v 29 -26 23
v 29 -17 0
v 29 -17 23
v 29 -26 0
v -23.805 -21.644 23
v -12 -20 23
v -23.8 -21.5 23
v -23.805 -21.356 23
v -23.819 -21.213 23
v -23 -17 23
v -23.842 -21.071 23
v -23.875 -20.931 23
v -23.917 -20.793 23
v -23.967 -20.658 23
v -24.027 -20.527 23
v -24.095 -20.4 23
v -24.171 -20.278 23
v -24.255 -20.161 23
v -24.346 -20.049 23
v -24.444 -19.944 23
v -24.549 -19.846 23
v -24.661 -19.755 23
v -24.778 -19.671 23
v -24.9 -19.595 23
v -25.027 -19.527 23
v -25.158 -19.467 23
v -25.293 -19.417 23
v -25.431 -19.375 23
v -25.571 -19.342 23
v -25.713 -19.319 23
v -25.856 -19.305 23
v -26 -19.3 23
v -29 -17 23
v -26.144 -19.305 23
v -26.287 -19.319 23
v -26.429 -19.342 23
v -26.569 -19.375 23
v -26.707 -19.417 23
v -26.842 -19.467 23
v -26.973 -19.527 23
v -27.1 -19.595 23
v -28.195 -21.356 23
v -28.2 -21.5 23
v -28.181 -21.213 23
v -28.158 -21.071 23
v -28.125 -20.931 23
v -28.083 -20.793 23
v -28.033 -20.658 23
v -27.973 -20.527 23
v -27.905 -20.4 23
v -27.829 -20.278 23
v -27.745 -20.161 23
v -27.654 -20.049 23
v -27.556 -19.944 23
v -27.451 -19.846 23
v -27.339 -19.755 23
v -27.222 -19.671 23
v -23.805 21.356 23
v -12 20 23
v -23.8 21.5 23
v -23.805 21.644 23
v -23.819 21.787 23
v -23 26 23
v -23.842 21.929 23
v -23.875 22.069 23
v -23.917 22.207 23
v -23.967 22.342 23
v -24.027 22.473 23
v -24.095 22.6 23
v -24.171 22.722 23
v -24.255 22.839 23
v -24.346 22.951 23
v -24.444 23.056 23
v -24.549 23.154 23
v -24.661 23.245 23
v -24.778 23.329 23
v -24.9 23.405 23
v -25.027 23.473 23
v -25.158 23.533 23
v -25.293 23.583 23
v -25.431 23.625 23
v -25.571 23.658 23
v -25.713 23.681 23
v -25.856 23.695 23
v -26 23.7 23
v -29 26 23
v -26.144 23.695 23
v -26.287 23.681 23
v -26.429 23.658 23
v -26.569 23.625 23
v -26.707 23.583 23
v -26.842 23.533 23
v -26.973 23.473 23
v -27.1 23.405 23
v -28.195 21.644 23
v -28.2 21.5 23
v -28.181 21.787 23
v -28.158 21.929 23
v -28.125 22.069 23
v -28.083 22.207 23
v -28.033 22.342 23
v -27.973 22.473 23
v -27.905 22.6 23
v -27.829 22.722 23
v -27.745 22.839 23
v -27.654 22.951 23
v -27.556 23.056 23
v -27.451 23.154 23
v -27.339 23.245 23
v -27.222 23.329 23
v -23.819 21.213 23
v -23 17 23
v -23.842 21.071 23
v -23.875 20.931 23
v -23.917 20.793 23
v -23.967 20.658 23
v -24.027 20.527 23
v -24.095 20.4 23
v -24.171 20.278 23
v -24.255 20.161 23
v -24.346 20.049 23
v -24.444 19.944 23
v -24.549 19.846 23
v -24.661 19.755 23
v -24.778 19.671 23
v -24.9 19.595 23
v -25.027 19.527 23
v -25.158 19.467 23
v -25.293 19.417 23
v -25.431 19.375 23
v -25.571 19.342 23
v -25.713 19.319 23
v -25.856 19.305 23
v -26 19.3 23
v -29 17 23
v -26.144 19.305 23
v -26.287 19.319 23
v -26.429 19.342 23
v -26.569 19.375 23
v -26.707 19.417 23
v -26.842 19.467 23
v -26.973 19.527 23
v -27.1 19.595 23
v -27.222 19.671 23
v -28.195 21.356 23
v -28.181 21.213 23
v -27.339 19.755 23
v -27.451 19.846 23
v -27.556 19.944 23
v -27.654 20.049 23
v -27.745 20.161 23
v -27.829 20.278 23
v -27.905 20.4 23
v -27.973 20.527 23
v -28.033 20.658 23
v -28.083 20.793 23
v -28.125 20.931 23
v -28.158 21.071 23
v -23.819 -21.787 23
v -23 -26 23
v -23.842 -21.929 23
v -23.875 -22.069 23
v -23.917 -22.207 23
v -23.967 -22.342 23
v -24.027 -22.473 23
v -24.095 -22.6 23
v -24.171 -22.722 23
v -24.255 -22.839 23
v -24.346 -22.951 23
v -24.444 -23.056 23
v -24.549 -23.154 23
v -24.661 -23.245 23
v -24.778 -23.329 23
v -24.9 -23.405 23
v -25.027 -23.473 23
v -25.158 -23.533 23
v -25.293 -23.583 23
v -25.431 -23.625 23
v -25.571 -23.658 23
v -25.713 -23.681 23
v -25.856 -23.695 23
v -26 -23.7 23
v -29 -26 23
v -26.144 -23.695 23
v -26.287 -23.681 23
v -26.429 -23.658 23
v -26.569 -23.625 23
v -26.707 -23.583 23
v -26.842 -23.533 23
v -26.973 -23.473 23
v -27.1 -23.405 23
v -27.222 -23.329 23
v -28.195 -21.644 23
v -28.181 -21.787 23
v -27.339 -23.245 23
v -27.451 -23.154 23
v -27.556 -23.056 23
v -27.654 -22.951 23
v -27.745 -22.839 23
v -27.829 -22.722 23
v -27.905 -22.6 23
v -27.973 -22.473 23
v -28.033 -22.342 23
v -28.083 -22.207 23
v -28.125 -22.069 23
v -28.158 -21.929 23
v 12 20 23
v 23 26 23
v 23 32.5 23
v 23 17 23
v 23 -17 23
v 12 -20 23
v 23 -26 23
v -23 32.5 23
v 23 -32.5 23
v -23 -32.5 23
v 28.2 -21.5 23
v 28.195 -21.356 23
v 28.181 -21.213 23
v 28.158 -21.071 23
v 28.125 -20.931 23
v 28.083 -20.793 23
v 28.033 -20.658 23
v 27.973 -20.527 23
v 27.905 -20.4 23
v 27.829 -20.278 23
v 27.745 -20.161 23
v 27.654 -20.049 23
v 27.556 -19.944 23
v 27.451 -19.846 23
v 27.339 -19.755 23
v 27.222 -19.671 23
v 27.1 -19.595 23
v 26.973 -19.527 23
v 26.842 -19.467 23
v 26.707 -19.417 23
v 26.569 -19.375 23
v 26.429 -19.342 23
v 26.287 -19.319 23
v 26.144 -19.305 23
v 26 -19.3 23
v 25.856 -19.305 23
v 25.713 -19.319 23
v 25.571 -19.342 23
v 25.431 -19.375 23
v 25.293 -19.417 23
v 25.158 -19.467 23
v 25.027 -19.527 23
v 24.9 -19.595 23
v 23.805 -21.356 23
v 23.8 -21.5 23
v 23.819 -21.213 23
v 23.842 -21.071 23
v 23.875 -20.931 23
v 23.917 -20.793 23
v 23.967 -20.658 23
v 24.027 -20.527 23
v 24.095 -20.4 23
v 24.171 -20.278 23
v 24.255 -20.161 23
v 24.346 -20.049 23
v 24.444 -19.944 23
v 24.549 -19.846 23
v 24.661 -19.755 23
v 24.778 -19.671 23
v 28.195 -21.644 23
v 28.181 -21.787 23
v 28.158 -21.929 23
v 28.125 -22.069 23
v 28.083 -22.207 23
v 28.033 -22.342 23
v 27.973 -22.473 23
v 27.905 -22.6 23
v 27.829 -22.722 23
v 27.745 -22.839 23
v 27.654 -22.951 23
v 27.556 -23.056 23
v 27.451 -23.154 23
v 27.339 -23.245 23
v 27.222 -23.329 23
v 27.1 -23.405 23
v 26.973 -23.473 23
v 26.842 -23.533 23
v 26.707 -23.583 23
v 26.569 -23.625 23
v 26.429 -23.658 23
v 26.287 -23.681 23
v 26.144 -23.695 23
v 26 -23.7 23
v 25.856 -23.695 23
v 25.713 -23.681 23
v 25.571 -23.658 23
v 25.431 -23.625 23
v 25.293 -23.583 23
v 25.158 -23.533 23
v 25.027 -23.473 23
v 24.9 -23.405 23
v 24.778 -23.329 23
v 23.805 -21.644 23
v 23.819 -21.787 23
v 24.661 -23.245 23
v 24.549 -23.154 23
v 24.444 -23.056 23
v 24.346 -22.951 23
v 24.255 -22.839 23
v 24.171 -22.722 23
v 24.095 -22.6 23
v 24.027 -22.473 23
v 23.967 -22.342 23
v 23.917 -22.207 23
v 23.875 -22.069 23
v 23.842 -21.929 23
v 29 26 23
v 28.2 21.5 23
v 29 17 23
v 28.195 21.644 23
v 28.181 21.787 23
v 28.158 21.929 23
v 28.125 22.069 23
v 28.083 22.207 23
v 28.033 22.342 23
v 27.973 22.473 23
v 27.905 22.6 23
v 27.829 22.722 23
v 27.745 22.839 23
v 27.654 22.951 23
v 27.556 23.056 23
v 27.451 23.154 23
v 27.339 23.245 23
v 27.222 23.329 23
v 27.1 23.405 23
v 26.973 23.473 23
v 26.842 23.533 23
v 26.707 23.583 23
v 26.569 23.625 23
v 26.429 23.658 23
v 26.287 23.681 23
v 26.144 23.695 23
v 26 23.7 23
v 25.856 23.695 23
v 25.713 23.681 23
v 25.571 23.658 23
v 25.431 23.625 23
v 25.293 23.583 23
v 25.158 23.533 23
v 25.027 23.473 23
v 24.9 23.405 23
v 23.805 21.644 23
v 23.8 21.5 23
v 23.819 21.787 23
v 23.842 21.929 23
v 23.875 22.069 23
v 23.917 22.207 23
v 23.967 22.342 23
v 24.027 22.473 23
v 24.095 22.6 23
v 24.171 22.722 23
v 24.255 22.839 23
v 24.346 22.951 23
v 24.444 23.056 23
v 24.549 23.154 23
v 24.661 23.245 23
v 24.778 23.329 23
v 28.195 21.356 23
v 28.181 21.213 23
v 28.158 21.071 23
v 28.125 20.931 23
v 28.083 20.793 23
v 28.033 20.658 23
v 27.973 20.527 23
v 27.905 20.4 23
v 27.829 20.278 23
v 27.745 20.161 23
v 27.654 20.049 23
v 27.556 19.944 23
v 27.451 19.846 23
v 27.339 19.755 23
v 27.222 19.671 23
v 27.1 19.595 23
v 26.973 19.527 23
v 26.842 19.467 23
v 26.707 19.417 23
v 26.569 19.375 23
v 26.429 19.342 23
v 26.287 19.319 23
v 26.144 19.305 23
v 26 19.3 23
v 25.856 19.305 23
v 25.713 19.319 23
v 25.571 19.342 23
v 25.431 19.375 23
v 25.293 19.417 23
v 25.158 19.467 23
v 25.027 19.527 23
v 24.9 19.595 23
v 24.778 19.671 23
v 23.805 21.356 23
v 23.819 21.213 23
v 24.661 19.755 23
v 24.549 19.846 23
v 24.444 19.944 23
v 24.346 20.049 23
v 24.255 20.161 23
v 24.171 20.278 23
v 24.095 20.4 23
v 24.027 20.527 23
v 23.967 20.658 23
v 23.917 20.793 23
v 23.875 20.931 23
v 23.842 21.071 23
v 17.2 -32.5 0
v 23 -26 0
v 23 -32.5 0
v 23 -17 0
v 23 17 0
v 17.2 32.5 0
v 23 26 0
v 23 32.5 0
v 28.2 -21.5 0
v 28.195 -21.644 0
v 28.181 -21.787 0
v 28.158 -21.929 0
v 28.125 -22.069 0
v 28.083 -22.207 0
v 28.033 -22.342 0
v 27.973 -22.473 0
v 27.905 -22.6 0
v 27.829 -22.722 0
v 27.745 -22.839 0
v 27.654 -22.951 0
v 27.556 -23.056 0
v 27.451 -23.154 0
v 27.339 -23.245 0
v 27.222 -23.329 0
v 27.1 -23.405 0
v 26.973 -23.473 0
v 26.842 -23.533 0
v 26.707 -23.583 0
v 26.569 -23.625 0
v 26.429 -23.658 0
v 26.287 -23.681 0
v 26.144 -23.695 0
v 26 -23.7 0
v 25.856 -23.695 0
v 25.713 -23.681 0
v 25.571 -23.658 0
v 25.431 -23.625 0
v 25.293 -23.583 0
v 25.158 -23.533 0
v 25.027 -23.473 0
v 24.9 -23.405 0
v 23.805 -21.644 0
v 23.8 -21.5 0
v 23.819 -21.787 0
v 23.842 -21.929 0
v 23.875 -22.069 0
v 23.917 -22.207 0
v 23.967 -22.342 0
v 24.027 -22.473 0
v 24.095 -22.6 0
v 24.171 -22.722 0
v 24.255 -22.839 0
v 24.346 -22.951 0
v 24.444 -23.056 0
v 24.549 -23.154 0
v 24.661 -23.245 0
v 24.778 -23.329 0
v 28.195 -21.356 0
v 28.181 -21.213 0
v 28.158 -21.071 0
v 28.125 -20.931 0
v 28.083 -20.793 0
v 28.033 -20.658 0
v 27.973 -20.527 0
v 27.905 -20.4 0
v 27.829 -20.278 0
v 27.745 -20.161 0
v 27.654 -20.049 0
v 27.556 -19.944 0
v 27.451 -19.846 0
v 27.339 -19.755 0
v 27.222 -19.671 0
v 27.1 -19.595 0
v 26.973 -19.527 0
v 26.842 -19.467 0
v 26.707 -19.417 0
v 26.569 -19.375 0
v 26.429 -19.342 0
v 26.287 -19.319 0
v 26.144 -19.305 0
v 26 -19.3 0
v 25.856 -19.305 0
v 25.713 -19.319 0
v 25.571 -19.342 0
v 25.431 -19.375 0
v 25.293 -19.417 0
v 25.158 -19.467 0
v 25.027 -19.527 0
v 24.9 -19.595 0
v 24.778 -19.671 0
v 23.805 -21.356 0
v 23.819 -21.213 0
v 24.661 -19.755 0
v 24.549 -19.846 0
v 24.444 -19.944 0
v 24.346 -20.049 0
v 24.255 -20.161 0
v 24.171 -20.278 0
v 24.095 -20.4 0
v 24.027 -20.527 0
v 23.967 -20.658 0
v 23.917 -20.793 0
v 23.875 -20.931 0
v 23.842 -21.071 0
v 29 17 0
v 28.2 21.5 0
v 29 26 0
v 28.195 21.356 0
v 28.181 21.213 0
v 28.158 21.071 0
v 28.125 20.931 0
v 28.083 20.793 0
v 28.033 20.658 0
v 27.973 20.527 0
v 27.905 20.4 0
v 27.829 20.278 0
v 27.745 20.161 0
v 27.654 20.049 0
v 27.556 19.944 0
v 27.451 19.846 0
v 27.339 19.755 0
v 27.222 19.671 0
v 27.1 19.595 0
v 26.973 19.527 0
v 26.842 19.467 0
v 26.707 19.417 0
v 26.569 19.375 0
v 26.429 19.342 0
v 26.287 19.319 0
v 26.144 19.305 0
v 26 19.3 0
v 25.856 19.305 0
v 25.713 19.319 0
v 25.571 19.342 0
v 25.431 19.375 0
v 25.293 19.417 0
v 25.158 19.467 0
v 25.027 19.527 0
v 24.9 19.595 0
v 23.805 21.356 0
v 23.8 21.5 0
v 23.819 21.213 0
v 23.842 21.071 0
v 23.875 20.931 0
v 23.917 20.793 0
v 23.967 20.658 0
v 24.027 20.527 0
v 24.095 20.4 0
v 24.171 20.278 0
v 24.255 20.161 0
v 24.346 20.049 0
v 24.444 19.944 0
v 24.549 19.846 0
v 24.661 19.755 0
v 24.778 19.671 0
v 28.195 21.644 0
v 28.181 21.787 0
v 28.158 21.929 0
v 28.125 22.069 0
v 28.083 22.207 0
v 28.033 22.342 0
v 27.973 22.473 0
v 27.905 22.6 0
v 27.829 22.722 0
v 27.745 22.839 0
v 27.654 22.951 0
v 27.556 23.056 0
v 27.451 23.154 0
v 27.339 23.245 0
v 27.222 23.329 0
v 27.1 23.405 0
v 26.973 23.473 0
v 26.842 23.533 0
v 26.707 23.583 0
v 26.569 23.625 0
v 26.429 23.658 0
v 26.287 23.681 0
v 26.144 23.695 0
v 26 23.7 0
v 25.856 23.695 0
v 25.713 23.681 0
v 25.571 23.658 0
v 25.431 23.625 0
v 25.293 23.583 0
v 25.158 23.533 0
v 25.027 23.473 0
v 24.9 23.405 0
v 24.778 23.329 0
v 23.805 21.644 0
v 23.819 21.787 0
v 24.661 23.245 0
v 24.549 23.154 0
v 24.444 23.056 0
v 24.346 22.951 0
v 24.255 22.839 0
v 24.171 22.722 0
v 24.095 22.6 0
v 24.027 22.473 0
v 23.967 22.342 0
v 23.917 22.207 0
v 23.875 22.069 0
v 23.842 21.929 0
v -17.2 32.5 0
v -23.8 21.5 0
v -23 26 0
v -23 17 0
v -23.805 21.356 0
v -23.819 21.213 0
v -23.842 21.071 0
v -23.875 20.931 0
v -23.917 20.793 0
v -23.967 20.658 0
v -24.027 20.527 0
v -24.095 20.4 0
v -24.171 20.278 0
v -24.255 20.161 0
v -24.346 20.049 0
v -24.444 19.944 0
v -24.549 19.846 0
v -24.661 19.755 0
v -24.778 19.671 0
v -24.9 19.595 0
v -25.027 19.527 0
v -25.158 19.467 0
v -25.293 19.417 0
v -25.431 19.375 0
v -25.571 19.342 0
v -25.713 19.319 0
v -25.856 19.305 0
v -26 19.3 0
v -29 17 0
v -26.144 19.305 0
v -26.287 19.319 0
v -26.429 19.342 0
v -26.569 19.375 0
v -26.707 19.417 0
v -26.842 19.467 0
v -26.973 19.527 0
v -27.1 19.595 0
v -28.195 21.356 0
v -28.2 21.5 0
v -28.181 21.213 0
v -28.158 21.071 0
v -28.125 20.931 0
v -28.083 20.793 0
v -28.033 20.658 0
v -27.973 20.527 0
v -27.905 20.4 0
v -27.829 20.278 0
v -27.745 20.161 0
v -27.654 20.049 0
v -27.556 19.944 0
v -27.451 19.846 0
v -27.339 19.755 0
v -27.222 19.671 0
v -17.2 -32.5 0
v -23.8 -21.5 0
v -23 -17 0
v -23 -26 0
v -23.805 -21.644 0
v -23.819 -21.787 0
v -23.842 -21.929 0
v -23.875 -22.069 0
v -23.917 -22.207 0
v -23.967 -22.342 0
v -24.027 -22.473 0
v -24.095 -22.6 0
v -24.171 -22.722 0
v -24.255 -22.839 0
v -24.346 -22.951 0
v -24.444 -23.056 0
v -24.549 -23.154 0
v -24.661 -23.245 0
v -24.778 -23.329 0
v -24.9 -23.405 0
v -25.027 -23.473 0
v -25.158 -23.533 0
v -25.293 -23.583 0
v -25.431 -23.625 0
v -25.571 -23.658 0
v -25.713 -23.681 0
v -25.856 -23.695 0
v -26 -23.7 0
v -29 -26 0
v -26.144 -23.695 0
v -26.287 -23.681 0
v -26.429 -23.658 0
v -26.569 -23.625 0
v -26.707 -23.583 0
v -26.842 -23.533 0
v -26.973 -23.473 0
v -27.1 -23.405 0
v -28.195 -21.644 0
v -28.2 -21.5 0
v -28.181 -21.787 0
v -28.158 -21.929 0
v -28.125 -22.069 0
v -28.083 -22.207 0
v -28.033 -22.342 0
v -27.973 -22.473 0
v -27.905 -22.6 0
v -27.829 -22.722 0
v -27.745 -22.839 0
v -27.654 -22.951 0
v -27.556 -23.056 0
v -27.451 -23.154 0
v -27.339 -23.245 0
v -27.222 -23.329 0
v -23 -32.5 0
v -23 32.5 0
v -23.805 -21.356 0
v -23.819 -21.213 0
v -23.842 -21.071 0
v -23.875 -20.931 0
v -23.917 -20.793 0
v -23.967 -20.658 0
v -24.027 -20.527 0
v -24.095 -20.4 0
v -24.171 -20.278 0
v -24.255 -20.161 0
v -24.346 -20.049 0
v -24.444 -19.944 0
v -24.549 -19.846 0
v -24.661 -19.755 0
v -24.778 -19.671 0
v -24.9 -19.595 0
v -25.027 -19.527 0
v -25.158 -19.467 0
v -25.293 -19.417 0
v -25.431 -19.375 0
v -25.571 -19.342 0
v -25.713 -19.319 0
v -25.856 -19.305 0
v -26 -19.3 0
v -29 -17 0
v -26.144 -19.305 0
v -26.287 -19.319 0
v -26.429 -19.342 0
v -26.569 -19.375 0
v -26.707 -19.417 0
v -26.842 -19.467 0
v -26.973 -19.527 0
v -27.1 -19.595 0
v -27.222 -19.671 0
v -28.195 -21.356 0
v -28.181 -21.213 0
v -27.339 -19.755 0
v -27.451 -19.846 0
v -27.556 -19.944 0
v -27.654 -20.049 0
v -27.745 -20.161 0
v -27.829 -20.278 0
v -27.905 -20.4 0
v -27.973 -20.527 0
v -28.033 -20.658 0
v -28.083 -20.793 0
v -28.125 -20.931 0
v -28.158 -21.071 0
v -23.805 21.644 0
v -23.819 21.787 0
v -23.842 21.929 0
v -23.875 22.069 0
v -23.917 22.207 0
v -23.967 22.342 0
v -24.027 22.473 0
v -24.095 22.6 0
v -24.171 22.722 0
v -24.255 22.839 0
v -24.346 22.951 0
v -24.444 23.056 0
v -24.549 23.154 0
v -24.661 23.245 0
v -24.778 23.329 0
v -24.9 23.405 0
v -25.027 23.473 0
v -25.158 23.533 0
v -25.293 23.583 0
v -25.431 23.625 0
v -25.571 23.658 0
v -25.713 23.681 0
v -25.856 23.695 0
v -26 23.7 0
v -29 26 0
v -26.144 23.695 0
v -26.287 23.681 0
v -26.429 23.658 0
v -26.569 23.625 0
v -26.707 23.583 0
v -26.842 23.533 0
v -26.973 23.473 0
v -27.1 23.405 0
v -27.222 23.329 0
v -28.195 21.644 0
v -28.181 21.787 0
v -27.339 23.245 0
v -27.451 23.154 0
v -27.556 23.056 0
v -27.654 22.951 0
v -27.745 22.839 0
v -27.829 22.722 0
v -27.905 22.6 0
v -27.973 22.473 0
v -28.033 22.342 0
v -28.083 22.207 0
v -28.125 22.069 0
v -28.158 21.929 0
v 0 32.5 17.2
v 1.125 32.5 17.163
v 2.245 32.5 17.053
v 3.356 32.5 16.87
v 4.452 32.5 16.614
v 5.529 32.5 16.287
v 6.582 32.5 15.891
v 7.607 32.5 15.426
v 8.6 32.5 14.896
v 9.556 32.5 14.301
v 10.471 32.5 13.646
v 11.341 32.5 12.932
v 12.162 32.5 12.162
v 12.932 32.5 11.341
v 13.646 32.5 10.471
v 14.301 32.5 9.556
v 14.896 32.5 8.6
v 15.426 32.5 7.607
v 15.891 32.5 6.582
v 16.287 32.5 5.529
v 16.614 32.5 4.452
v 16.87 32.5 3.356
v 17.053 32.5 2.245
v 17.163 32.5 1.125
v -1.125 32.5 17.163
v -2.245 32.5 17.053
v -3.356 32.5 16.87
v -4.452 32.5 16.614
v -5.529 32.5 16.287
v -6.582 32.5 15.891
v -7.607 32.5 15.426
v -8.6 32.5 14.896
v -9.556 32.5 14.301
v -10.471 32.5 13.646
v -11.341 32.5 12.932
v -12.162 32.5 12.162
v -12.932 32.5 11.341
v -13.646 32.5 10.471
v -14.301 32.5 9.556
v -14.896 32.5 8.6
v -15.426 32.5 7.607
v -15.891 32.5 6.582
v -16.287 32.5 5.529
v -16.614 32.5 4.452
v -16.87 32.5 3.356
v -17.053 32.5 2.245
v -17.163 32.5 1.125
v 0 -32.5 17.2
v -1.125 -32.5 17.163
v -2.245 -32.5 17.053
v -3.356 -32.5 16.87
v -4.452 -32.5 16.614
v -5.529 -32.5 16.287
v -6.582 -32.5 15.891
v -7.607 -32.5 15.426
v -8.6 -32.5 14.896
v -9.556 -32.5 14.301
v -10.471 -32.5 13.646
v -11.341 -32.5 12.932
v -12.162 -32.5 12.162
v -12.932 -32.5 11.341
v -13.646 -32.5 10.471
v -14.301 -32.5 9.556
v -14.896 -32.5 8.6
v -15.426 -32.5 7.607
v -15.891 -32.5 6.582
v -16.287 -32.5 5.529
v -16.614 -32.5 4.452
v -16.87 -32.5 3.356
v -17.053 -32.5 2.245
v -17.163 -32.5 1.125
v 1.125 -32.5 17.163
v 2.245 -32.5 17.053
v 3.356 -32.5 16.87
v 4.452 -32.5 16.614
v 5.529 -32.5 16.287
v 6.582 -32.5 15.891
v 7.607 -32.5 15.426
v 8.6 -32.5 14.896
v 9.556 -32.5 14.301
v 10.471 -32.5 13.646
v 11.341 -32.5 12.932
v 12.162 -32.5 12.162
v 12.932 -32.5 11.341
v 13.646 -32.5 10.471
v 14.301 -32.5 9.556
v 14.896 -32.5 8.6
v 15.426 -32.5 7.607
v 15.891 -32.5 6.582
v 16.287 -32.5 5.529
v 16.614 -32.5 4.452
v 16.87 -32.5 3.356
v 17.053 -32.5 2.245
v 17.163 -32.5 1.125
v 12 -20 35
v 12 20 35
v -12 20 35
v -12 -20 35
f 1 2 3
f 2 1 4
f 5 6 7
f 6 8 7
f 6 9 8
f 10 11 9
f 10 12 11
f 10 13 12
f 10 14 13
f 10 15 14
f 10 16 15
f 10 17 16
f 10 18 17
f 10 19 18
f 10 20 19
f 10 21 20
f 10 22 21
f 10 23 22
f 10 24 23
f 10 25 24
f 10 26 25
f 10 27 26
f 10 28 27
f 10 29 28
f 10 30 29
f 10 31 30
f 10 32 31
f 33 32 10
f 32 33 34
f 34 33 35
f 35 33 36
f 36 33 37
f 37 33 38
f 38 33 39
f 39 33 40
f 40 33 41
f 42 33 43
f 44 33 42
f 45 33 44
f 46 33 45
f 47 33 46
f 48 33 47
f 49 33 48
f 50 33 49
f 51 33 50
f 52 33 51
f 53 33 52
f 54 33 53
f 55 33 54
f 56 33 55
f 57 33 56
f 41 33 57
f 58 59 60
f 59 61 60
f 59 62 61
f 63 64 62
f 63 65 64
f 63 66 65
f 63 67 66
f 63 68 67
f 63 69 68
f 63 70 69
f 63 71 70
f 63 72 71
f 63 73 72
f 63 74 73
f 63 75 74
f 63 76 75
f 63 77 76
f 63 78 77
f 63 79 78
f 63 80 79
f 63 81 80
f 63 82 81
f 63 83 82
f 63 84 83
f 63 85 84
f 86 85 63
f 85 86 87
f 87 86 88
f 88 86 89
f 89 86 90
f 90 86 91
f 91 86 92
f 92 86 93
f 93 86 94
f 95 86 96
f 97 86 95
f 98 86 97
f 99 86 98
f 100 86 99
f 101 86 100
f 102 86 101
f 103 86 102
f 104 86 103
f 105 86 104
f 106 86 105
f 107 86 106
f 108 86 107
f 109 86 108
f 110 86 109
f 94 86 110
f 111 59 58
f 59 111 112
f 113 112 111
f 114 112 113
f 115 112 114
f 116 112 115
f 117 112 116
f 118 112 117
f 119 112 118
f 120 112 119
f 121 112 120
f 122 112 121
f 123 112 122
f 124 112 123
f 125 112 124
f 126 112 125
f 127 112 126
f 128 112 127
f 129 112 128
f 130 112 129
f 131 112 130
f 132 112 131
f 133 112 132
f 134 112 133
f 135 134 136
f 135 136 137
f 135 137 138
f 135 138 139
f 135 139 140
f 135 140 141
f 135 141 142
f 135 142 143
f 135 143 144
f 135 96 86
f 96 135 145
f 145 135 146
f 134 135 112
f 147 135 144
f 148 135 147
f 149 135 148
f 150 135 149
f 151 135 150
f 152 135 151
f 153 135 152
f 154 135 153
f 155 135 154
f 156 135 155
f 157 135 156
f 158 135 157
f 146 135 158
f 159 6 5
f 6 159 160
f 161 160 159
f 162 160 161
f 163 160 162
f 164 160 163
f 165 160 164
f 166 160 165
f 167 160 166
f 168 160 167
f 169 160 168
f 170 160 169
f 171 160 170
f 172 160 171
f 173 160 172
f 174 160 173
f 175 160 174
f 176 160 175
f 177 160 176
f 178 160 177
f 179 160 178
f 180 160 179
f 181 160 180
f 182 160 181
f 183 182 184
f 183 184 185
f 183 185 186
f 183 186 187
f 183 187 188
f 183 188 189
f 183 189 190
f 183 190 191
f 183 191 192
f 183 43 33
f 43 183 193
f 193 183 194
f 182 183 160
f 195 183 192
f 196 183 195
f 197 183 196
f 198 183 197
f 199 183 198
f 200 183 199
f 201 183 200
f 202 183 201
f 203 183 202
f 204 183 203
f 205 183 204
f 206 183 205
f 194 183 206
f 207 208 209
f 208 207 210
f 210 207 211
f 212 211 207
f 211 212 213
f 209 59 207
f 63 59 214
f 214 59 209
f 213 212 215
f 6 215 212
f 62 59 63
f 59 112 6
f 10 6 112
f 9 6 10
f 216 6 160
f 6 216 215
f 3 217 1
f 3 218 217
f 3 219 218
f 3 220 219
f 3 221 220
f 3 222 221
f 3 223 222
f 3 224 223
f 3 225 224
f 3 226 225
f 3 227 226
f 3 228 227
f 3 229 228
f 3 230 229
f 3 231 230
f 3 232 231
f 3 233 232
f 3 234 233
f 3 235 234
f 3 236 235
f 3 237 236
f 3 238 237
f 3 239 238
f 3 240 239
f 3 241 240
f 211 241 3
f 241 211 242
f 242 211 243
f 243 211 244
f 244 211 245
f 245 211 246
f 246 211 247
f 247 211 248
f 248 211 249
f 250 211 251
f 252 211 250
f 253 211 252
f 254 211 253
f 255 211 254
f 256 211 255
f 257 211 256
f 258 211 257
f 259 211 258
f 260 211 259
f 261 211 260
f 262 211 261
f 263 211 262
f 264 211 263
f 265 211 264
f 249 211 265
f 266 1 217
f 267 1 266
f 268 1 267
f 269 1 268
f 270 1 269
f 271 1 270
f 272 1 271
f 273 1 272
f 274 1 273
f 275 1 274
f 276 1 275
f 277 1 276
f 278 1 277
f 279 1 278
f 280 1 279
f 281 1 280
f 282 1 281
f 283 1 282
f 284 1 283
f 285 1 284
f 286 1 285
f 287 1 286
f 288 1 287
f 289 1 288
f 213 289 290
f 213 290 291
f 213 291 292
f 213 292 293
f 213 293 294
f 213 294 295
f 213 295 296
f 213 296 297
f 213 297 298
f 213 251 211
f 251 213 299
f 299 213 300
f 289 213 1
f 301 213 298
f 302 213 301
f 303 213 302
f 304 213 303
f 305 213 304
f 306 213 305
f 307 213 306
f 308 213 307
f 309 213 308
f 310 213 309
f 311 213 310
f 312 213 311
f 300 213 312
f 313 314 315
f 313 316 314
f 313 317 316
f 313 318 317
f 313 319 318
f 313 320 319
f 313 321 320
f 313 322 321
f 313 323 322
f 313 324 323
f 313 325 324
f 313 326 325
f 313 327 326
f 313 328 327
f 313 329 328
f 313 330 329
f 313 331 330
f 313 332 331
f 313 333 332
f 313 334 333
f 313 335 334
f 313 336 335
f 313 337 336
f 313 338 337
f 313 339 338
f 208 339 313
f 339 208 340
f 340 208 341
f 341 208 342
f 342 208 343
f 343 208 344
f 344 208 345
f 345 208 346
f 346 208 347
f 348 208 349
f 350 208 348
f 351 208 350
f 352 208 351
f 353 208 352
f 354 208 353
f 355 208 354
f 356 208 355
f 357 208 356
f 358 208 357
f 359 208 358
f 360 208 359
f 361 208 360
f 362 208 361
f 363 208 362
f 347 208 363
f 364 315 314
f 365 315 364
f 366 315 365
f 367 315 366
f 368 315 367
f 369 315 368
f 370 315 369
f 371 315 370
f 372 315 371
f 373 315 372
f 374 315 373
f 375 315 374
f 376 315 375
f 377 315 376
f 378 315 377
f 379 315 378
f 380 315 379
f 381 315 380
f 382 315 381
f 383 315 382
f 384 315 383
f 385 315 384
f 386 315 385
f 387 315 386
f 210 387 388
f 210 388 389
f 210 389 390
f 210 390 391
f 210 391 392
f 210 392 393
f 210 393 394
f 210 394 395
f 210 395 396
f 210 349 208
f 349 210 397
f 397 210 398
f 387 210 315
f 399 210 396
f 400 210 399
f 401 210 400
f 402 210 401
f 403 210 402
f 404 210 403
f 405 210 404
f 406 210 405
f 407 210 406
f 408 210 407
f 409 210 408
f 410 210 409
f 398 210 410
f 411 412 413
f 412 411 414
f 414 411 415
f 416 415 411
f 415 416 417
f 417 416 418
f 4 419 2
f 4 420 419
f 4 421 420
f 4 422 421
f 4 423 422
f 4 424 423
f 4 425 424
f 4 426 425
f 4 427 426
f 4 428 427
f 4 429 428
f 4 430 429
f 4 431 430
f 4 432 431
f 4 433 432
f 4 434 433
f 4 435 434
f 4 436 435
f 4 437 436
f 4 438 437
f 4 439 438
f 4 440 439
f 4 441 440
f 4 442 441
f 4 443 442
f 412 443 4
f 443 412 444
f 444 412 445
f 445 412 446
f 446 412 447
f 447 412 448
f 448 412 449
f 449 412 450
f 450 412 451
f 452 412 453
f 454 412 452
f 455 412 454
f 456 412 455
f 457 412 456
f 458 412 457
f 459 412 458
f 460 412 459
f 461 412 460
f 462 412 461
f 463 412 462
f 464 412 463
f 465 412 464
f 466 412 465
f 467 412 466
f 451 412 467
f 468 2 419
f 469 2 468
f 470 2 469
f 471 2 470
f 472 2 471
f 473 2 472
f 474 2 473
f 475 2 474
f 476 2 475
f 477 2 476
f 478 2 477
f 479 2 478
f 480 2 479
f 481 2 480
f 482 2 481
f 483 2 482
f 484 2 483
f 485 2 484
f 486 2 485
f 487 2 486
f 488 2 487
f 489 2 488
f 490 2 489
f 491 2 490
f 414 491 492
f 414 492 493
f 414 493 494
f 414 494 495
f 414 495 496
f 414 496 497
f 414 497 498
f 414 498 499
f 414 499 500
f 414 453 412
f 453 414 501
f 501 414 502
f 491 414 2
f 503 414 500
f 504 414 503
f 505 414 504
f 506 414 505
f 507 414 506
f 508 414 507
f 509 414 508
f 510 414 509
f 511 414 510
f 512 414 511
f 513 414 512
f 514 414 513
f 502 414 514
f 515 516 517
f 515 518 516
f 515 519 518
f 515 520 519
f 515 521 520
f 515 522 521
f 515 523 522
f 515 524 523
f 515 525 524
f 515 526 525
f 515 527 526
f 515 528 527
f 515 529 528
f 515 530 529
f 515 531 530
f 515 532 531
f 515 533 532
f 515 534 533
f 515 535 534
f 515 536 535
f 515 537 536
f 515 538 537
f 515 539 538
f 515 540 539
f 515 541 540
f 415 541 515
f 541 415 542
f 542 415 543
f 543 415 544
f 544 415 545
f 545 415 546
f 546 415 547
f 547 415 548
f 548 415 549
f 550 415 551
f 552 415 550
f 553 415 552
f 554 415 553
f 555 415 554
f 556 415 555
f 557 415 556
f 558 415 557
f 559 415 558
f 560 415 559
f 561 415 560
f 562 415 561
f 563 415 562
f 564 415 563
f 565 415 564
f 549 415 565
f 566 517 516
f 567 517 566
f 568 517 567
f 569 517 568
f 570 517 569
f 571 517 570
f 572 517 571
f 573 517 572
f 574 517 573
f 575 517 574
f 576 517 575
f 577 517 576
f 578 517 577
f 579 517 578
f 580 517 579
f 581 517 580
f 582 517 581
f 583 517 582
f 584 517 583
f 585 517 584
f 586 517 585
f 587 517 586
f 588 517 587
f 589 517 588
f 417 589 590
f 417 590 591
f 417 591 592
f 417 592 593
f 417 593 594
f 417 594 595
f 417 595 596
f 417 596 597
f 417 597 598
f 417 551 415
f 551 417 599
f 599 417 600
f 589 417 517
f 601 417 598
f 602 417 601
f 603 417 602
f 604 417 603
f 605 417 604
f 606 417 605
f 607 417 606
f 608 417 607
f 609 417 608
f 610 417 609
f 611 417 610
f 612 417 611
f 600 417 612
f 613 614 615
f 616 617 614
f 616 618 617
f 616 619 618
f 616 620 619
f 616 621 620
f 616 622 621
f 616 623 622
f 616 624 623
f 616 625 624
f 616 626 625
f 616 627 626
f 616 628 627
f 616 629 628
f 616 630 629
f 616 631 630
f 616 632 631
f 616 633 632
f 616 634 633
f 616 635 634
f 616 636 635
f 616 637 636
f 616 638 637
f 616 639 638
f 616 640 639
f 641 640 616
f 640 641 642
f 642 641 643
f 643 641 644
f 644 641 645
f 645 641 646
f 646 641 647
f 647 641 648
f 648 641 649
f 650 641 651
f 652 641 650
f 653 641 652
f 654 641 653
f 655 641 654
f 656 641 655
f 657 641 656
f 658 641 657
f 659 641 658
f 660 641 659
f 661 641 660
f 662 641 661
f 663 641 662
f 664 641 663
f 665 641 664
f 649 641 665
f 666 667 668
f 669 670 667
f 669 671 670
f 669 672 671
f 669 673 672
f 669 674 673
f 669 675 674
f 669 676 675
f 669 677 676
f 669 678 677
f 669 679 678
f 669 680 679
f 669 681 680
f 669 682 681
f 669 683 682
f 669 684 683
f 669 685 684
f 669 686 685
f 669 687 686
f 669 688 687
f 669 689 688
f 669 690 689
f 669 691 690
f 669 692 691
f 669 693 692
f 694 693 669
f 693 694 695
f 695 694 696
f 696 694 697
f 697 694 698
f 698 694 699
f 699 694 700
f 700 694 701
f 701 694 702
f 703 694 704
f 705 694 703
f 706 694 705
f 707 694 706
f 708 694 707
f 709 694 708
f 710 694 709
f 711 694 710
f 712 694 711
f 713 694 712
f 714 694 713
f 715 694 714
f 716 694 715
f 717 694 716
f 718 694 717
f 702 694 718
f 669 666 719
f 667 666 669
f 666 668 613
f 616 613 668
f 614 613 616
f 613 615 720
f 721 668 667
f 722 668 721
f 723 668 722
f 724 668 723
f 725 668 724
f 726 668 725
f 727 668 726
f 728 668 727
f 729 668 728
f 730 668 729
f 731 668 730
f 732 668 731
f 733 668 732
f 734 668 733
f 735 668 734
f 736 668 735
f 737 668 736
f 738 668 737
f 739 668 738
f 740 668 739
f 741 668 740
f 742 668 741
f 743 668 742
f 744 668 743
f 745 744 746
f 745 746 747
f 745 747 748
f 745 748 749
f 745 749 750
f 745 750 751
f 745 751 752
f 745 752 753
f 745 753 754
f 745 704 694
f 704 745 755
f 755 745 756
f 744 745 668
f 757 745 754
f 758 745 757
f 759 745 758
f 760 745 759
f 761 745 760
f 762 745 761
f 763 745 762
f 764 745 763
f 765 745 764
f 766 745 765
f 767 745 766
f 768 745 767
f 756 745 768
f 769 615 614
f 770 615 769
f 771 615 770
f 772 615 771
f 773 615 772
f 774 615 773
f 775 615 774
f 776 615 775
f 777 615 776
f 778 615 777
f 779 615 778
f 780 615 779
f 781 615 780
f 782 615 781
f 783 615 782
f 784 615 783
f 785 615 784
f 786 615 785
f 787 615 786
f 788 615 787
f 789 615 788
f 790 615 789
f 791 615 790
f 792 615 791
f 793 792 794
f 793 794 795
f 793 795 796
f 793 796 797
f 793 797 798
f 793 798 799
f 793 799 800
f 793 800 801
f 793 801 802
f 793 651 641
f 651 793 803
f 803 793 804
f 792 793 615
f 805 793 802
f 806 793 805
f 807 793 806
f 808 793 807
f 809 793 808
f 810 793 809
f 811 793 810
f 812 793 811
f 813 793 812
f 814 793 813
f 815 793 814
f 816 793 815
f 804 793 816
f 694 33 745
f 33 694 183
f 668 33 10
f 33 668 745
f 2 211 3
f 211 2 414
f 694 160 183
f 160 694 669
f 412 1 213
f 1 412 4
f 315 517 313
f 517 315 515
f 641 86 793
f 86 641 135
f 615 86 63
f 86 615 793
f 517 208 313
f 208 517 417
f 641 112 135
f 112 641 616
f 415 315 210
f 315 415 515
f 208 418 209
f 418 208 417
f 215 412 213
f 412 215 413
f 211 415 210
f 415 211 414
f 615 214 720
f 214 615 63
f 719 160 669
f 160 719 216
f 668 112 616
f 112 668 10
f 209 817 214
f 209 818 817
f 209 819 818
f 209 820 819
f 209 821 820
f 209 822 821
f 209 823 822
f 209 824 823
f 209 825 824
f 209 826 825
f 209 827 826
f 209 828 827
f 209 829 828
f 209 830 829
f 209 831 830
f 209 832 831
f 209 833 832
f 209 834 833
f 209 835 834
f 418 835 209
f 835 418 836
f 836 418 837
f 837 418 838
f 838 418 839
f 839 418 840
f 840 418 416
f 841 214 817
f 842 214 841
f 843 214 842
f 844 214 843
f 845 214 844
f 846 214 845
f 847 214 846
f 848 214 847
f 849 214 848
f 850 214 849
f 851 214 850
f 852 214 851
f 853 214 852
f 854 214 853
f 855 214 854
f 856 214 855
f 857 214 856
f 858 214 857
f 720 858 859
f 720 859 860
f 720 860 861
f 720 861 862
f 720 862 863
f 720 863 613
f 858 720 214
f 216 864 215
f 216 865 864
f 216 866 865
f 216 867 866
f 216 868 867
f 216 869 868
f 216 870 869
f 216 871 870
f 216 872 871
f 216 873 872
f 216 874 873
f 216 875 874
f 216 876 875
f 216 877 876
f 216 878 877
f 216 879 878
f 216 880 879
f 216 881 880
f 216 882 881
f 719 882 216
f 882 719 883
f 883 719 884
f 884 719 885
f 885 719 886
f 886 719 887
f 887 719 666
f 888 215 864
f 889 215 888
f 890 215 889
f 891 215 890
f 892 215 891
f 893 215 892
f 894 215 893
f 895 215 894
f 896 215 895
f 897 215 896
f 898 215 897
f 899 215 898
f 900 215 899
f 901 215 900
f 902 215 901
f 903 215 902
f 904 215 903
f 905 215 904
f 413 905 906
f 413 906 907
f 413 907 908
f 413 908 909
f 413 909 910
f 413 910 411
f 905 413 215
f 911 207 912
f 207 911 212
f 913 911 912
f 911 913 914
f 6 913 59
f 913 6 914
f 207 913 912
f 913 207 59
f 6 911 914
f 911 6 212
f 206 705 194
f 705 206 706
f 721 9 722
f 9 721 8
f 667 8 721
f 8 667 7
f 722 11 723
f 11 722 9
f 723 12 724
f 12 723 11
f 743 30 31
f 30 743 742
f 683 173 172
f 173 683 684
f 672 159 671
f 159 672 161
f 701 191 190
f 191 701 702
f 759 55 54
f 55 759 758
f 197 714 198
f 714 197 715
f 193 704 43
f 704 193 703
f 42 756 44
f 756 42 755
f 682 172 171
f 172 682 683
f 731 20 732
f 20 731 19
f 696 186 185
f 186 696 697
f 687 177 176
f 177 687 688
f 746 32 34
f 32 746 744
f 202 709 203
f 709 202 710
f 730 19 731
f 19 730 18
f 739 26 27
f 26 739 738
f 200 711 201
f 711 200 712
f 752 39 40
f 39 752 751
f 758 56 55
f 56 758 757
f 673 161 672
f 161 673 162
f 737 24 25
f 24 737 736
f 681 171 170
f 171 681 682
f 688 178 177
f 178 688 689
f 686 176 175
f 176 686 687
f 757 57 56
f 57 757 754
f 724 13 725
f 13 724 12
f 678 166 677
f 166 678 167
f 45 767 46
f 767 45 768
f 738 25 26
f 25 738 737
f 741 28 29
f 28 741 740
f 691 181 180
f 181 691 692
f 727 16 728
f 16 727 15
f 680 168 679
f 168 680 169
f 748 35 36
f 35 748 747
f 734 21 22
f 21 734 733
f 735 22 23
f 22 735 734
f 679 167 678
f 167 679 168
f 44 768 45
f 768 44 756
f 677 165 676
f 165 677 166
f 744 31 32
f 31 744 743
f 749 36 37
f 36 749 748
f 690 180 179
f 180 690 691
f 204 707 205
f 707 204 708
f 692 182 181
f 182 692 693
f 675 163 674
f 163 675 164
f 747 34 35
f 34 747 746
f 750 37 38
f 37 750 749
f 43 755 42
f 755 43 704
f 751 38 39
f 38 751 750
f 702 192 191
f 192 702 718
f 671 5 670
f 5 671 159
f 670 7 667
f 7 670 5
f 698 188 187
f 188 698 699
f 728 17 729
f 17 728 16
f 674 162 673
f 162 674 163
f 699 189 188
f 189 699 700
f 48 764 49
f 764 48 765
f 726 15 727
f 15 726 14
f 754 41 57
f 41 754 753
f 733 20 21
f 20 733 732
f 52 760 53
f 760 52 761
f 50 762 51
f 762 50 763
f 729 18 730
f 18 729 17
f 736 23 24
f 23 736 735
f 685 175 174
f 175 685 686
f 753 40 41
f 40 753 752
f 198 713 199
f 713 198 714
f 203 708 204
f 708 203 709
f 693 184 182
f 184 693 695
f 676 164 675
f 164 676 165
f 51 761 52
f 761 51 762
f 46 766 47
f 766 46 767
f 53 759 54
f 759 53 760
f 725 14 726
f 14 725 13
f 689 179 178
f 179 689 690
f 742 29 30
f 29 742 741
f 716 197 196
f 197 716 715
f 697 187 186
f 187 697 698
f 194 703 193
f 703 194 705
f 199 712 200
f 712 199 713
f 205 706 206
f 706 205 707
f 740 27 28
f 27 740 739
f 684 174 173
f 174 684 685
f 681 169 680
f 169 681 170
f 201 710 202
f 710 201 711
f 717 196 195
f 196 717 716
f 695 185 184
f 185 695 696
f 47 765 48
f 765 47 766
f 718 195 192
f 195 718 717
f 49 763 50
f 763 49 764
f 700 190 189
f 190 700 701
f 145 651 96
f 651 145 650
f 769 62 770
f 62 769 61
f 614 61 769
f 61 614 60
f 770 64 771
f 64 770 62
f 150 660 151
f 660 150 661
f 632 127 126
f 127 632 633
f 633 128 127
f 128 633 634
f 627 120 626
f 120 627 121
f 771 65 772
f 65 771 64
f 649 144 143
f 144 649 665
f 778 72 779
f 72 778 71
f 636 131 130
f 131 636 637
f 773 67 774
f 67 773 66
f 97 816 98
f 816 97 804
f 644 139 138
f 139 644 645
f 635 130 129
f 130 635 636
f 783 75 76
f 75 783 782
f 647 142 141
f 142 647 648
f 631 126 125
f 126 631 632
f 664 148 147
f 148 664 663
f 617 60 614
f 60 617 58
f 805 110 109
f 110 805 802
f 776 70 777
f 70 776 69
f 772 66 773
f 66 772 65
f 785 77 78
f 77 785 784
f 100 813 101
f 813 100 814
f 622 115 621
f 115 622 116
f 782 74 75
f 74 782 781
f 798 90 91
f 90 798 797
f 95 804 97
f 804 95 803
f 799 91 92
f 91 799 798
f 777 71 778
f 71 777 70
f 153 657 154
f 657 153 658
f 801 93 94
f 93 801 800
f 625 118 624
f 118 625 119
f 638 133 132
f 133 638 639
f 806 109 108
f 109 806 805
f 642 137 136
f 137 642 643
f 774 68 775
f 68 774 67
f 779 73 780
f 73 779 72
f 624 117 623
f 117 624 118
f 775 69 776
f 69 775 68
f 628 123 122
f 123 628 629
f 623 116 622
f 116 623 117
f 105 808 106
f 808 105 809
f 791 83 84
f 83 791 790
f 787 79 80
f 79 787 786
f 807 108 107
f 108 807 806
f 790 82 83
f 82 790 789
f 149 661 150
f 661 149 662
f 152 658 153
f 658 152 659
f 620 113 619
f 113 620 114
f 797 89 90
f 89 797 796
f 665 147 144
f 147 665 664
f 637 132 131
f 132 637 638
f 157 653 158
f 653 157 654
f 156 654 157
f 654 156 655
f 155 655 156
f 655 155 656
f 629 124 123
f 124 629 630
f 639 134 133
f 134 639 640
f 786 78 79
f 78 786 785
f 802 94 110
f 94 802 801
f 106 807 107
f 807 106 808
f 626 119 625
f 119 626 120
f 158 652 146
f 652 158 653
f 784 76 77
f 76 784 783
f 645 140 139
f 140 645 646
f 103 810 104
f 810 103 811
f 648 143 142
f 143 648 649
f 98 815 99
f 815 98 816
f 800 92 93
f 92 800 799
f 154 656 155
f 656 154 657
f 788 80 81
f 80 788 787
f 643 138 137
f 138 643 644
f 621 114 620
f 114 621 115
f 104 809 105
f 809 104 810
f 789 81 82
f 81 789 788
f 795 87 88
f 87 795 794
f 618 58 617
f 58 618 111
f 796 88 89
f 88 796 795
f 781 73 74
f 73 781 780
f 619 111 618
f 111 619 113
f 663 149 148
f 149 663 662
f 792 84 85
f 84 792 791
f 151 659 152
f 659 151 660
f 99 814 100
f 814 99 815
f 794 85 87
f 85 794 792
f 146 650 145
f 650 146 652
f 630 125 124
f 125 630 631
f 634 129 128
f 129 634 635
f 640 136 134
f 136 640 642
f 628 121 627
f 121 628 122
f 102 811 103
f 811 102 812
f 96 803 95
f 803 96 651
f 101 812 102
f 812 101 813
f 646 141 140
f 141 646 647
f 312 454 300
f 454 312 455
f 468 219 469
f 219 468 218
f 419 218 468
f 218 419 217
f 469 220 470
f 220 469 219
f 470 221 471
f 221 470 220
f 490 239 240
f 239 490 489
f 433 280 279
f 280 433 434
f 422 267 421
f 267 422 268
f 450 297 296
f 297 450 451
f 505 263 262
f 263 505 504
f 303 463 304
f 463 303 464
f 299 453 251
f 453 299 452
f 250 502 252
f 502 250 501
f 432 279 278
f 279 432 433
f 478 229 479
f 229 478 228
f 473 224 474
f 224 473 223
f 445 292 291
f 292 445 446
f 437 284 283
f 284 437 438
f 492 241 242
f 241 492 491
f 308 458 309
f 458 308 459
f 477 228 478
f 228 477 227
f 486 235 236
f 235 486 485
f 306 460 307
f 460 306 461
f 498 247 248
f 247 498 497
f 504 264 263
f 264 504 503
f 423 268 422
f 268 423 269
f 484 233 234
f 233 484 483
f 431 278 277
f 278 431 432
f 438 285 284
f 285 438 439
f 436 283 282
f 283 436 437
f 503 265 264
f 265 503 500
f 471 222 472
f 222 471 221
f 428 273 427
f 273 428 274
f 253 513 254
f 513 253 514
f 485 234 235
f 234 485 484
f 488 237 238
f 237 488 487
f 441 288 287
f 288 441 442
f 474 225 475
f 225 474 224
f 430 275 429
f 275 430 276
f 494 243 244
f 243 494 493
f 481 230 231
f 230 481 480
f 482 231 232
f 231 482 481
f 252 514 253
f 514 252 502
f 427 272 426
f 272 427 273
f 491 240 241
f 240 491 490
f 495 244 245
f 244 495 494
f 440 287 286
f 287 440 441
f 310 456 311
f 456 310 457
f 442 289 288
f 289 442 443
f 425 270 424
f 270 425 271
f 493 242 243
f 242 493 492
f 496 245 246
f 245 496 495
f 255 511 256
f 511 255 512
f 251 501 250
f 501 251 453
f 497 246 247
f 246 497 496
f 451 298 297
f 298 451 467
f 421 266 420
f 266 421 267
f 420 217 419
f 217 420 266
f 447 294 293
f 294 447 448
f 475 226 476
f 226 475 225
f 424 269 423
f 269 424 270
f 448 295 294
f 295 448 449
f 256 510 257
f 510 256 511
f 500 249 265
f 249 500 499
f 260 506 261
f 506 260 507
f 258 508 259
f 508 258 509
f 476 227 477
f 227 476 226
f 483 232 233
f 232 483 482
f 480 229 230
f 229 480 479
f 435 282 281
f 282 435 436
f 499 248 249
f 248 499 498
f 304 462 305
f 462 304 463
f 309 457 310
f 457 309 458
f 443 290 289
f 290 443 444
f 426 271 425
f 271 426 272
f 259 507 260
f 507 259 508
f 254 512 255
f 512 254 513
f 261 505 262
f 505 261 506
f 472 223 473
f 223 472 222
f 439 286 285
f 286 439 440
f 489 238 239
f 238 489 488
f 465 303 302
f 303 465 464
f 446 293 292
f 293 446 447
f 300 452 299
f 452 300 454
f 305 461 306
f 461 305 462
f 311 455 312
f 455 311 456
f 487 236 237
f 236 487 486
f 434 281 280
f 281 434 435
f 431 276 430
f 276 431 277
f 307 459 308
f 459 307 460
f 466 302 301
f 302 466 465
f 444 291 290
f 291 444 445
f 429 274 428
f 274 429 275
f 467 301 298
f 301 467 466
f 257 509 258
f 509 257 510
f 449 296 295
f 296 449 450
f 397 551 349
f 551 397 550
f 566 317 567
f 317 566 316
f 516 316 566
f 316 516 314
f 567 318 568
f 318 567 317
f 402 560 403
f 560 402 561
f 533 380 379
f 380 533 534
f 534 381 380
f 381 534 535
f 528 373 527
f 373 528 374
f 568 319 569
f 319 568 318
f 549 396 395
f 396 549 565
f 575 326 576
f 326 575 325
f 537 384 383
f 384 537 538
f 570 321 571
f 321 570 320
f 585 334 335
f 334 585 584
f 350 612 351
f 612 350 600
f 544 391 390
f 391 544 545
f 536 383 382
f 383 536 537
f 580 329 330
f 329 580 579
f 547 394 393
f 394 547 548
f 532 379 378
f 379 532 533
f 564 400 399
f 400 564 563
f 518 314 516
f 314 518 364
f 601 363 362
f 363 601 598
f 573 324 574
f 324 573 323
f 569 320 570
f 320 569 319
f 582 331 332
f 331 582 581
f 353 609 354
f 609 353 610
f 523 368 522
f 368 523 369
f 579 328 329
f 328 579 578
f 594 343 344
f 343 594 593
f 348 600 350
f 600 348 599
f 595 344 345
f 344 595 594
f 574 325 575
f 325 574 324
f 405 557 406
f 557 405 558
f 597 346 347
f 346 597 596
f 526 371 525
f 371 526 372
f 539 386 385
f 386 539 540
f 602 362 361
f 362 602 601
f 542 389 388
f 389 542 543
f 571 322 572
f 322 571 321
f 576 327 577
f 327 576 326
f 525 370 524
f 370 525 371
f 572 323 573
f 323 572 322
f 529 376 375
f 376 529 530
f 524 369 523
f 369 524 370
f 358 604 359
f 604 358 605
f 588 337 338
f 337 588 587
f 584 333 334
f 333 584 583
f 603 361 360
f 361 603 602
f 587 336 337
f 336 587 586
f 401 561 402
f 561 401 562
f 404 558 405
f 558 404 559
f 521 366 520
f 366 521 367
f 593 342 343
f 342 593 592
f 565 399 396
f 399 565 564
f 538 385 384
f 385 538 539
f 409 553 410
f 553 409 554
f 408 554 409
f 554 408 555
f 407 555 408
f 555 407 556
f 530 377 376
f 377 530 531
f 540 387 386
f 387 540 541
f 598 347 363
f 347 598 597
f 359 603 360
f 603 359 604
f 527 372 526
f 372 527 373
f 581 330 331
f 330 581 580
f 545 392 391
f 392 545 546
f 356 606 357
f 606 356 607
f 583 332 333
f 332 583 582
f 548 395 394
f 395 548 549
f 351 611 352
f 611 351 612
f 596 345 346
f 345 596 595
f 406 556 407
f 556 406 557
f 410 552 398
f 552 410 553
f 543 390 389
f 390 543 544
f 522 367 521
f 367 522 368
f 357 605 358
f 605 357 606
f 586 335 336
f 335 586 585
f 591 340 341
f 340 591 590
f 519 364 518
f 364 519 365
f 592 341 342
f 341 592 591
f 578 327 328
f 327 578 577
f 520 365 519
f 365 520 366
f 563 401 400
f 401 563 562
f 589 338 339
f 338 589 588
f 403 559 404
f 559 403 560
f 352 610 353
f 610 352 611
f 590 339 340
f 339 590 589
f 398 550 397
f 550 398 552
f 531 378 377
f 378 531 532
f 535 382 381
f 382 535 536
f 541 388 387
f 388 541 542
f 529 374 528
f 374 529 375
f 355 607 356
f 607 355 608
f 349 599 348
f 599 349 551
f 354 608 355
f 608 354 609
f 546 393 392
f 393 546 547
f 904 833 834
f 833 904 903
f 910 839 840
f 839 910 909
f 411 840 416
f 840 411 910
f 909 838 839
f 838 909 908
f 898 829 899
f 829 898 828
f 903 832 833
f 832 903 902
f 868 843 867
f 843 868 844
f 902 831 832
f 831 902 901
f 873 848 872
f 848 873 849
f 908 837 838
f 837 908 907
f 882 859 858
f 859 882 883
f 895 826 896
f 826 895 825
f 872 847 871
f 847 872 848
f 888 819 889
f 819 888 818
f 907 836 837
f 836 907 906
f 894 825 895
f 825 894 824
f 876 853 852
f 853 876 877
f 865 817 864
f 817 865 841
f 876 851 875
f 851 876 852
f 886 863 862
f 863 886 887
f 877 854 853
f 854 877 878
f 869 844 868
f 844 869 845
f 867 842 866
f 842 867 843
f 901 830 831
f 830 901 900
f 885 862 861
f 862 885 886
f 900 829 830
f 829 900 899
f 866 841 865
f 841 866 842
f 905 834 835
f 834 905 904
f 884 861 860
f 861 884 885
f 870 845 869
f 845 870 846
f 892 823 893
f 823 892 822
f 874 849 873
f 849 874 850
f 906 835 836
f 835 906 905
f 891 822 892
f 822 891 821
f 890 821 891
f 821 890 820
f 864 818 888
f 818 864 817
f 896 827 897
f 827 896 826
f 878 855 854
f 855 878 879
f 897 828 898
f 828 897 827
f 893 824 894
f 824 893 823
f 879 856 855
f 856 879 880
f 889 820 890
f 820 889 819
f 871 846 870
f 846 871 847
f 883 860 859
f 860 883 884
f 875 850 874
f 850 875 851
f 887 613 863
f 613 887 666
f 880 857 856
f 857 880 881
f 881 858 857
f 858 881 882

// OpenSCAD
// RoboBarista: PARAMETRIC PROTOTYPE ONLY - dimension inputs must be measured.
// OpenSCAD: set part = "portafilter" or "pitcher"; export each half separately.
// Units millimeters. Never rely on friction-only grasp for hot liquid.
$fn=96;
part="portafilter"; // ["portafilter","pitcher"]
half="lower"; // ["lower","upper"]
// CALIBRATION REQUIRED: placeholder measurements, NOT Decent specifications.
pf_diameter=32; pf_length=65;
pitcher_handle_width=18; pitcher_handle_thickness=7; pitcher_length=34;
clearance=0.4; liner=1.0;
wall=6; bolt_d=4.4; bolt_offset=11;
grip_width=24; grip_depth=12;
module half_clamp(inner_width,inner_height,L,rounded=false) {
  outer_width=inner_width+2*liner+2*wall;
  outer_height=inner_height+2*liner+2*wall;
  difference() {
    union(){
      translate([0,0,outer_height/4])
        cube([outer_width,L,outer_height/2],center=true);
      for(y=[-L/2+bolt_offset,L/2-bolt_offset])
        translate([0,y,outer_height/4]) cube([outer_width+12,9,outer_height/2],center=true);
      // External IR40 contact datum: symmetric flat, repeatable approach
      translate([0,0,outer_height/2+grip_depth/2])
        cube([grip_width,min(L-4,40),grip_depth],center=true);
    }
    // Profile channel: open towards mating half
    if(rounded)
      translate([0,0,0]) rotate([90,0,0]) cylinder(d=inner_width+2*liner+clearance,h=L+2,center=true);
    else
      translate([0,0,0]) cube([inner_width+2*liner+clearance,L+2,inner_height+2*liner+clearance],center=true);
    // Bolt holes from mating face. Bolts need final access check.
    for (x=[-outer_width/2-3,outer_width/2+3],y=[-L/2+bolt_offset,L/2-bolt_offset])
      translate([x,y,outer_height/4]) cylinder(d=bolt_d,h=outer_height+grip_depth+4,center=true);
  }
}
module selected() {
  if(part=="portafilter") half_clamp(pf_diameter,pf_diameter,pf_length,true);
  else half_clamp(pitcher_handle_width,pitcher_handle_thickness,pitcher_length,false);
}
// Mirror around mating plane, shift for print layout
if(half=="upper") translate([0,0,0]) mirror([0,0,1]) selected();
else selected();
